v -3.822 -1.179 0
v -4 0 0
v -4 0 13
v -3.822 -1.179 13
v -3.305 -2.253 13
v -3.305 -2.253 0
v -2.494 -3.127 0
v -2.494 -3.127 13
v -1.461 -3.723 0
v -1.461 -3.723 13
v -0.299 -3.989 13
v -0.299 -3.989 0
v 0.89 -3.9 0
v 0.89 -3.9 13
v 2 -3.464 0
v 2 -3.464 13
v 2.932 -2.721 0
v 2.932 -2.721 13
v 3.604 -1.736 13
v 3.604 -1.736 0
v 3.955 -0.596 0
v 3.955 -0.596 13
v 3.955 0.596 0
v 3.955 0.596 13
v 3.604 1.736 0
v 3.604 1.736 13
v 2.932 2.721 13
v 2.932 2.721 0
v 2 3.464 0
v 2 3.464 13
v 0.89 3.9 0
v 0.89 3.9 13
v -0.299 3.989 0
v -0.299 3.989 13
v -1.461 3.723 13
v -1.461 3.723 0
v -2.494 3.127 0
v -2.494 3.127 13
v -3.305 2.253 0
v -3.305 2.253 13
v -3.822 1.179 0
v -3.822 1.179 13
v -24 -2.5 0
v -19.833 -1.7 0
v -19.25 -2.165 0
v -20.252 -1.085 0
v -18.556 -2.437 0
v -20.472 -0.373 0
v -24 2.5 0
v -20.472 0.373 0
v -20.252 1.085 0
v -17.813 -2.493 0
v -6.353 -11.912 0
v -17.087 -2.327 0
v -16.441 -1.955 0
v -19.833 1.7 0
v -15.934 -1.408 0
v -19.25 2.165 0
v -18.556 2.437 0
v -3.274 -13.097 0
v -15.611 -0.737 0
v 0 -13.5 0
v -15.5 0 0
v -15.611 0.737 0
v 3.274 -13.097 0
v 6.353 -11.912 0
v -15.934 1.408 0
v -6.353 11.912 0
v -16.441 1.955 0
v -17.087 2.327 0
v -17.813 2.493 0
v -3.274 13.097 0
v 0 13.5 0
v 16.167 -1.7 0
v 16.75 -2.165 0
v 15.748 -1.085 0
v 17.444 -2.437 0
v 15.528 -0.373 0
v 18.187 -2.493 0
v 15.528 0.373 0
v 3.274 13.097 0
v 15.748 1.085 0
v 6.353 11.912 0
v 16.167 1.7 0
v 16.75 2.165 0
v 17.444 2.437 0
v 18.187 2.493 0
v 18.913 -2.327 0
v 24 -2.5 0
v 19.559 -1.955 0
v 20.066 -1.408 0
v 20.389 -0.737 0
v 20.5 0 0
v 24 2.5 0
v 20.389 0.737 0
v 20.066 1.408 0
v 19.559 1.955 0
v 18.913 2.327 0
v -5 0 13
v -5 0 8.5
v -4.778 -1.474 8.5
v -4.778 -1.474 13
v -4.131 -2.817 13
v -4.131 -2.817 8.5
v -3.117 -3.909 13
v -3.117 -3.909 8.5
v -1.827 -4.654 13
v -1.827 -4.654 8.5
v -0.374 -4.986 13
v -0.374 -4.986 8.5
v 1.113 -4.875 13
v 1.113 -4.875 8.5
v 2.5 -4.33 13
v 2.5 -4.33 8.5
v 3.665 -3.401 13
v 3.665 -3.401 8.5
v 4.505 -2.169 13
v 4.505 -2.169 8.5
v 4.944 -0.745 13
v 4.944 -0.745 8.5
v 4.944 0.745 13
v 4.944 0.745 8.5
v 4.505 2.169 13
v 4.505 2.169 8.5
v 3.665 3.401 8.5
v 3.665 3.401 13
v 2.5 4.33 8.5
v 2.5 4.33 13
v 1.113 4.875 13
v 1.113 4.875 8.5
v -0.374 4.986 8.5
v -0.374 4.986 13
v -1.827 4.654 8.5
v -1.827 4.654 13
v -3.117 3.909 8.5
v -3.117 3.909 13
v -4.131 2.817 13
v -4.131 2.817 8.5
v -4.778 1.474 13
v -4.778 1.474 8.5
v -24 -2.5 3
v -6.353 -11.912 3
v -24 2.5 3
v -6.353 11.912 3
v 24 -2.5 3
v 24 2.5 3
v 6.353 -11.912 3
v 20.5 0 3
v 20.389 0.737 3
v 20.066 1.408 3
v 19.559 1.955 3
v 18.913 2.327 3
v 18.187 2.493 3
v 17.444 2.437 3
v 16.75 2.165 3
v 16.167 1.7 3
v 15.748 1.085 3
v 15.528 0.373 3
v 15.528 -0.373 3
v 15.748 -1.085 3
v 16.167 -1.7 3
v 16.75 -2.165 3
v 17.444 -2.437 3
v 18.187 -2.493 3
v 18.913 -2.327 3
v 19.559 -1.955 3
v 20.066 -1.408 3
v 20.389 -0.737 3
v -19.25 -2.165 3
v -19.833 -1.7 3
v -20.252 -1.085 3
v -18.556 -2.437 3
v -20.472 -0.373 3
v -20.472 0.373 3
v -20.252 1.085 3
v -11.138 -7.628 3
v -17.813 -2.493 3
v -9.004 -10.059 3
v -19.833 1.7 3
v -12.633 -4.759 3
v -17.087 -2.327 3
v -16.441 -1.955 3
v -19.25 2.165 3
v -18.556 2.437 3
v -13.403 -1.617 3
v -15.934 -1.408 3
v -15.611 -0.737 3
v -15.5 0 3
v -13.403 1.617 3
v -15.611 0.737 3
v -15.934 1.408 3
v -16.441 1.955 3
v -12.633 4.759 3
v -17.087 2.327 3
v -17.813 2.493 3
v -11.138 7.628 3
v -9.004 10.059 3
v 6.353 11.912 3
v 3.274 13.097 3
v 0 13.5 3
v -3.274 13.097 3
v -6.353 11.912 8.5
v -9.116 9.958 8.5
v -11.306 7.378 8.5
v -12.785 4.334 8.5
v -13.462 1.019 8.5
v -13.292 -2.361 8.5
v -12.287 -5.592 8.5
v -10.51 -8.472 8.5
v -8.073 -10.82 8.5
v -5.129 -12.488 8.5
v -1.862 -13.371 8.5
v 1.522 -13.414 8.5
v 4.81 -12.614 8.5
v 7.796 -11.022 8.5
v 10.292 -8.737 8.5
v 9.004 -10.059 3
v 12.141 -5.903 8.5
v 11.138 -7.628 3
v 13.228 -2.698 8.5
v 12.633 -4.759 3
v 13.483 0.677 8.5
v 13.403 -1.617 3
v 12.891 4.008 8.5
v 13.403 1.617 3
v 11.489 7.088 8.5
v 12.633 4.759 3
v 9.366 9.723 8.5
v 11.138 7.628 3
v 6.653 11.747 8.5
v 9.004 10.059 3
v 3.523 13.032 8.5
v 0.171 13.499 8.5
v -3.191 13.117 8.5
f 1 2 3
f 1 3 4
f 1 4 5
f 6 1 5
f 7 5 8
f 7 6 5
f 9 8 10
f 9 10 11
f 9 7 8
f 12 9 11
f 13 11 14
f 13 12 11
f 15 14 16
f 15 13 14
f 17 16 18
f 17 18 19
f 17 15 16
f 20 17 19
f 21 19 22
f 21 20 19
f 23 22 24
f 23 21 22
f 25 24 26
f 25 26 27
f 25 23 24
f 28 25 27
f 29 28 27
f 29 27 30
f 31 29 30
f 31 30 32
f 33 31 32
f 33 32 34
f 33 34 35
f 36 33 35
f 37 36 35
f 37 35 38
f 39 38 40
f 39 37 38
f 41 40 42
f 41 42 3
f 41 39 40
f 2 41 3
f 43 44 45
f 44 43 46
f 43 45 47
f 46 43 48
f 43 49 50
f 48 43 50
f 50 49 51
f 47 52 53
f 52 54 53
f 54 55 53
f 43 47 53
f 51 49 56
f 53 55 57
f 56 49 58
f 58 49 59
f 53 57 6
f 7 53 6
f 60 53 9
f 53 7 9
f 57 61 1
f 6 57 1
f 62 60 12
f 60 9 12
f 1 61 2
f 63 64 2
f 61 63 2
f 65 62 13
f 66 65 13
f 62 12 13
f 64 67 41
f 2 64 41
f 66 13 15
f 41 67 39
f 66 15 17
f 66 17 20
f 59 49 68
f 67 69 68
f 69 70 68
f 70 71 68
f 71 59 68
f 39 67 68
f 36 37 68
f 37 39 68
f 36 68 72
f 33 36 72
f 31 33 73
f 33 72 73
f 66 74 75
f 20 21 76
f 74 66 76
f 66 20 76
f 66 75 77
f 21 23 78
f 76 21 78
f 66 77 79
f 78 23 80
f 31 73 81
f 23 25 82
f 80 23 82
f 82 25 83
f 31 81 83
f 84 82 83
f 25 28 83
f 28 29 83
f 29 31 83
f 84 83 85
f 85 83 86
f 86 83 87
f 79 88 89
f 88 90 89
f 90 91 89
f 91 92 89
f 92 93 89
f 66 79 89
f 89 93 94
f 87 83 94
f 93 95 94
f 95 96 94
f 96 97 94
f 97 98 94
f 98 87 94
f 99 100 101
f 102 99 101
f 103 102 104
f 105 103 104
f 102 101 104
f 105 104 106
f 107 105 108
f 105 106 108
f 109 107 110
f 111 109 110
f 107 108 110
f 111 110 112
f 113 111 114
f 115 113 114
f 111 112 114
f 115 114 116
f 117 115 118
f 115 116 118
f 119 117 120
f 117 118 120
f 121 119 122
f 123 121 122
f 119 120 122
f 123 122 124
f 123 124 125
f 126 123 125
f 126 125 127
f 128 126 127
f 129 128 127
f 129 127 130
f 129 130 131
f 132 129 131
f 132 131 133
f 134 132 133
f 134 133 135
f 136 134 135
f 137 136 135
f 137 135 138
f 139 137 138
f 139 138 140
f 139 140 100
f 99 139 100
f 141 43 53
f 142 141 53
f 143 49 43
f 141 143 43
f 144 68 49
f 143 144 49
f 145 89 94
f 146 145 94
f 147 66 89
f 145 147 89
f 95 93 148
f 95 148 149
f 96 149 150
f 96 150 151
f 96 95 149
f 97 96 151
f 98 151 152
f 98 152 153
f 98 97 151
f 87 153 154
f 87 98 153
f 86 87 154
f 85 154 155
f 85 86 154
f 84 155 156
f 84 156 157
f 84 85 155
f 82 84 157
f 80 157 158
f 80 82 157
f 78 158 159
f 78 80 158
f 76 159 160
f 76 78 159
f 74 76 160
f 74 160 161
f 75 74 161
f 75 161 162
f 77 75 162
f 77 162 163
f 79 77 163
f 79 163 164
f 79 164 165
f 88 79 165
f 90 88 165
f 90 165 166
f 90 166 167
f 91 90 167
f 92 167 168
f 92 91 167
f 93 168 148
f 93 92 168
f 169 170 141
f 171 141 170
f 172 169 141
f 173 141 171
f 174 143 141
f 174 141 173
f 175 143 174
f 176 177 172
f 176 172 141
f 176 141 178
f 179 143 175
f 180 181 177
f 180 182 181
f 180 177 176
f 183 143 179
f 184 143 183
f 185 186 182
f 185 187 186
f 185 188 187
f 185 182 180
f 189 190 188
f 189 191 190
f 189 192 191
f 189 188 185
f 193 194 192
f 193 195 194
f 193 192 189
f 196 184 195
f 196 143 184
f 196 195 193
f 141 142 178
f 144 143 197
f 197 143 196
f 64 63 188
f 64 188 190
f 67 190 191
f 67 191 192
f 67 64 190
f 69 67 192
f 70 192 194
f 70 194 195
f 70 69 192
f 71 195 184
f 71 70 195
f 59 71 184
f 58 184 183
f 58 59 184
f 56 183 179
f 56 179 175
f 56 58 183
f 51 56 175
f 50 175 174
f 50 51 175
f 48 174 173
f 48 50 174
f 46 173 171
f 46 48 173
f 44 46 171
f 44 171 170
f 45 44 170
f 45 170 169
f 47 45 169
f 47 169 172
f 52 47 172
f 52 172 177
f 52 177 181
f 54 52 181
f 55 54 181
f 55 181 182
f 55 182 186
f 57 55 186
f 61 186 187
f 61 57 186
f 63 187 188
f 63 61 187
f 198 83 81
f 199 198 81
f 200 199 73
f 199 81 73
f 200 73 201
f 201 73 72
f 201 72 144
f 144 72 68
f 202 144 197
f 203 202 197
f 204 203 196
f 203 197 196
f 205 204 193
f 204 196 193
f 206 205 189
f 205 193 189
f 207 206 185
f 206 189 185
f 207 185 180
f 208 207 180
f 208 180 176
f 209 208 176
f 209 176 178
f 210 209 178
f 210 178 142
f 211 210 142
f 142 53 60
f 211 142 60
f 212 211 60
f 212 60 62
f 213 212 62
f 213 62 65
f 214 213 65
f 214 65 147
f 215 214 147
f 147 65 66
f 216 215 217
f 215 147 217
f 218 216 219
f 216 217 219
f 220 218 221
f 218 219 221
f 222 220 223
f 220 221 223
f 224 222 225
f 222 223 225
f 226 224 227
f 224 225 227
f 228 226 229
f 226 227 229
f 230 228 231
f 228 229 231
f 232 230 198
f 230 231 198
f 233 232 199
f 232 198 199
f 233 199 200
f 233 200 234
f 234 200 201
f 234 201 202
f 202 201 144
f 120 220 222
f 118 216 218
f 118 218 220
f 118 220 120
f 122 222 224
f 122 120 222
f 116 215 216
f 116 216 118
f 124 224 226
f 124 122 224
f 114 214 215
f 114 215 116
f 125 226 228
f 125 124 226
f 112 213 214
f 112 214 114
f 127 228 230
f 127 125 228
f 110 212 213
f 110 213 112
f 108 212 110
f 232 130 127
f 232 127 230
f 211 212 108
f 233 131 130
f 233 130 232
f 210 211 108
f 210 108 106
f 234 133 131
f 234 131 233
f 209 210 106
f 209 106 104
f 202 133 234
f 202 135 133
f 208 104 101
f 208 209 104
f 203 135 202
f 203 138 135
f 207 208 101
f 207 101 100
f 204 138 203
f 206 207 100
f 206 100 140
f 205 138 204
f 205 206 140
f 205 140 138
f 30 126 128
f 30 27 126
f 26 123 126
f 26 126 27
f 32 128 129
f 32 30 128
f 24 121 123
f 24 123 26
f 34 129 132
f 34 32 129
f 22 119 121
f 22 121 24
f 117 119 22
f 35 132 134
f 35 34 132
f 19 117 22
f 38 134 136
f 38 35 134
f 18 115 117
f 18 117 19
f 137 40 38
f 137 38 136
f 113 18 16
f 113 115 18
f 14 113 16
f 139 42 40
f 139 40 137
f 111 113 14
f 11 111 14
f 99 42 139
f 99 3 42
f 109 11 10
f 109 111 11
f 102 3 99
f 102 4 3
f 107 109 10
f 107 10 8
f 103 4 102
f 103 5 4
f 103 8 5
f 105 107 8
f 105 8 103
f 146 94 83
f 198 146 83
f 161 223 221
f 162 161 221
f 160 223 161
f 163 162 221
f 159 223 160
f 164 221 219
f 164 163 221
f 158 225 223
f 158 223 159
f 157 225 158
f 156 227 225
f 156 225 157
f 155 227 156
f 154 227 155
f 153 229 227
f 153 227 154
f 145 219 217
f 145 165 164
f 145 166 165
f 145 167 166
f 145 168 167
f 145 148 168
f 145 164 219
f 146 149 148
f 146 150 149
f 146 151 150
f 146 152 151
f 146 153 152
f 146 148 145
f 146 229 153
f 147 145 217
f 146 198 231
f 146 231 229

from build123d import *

# Parameters (mm, degrees)
SKETCH_1_R      = 2.5
SKETCH_1_R_2    = 5
EXTRUDE_1_DEPTH = 3
SKETCH_1_3_R    = 5
EXTRUDE_2_DEPTH = 8.5
SKETCH_1_4_R    = 5
SKETCH_1_4_R_2  = 4
EXTRUDE_3_DEPTH = 13


with BuildPart() as part:
    # 草图1 → 凸台-拉伸1 (new body)
    with BuildSketch(Plane.XY):
        with BuildLine():
            Line((-24, 2.5), (-24, -2.5))
            Line((-24, -2.5), (-6.352941176, -11.911764706))
            ThreePointArc((-6.352941176, -11.911764706), (0, -13.5), (6.352941176, -11.911764706))
            Line((6.352941176, -11.911764706), (24, -2.5))
            Line((24, -2.5), (24, 2.5))
            Line((24, 2.5), (6.352941176, 11.911764706))
            ThreePointArc((6.352941176, 11.911764706), (0, 13.5), (-6.352941176, 11.911764706))
            Line((-6.352941176, 11.911764706), (-24, 2.5))
        make_face()
        with Locations((-18, 0)):
            Circle(SKETCH_1_R, mode=Mode.SUBTRACT)
        Circle(SKETCH_1_R_2, mode=Mode.SUBTRACT)
        with Locations((18, 0)):
            Circle(SKETCH_1_R, mode=Mode.SUBTRACT)
    extrude(amount=EXTRUDE_1_DEPTH)

    # 草图1<3> → 凸台-拉伸2 (add)
    with BuildSketch(Plane.XY):
        with BuildLine():
            ThreePointArc((-6.352941176, 11.911764706), (-13.5, 0), (-6.352941176, -11.911764706))
            ThreePointArc((-6.352941176, -11.911764706), (0, -13.5), (6.352941176, -11.911764706))
            ThreePointArc((6.352941176, -11.911764706), (11.576154497, -6.945692698), (13.5, 0))
            ThreePointArc((13.5, 0), (11.576154497, 6.945692698), (6.352941176, 11.911764706))
            ThreePointArc((6.352941176, 11.911764706), (0, 13.5), (-6.352941176, 11.911764706))
        make_face()
        Circle(SKETCH_1_3_R, mode=Mode.SUBTRACT)
    extrude(amount=EXTRUDE_2_DEPTH)

    # 草图1<4> → 凸台-拉伸3 (add)
    with BuildSketch(Plane.XY):
        Circle(SKETCH_1_4_R)
        Circle(SKETCH_1_4_R_2, mode=Mode.SUBTRACT)
    extrude(amount=EXTRUDE_3_DEPTH)


solid = part.part
